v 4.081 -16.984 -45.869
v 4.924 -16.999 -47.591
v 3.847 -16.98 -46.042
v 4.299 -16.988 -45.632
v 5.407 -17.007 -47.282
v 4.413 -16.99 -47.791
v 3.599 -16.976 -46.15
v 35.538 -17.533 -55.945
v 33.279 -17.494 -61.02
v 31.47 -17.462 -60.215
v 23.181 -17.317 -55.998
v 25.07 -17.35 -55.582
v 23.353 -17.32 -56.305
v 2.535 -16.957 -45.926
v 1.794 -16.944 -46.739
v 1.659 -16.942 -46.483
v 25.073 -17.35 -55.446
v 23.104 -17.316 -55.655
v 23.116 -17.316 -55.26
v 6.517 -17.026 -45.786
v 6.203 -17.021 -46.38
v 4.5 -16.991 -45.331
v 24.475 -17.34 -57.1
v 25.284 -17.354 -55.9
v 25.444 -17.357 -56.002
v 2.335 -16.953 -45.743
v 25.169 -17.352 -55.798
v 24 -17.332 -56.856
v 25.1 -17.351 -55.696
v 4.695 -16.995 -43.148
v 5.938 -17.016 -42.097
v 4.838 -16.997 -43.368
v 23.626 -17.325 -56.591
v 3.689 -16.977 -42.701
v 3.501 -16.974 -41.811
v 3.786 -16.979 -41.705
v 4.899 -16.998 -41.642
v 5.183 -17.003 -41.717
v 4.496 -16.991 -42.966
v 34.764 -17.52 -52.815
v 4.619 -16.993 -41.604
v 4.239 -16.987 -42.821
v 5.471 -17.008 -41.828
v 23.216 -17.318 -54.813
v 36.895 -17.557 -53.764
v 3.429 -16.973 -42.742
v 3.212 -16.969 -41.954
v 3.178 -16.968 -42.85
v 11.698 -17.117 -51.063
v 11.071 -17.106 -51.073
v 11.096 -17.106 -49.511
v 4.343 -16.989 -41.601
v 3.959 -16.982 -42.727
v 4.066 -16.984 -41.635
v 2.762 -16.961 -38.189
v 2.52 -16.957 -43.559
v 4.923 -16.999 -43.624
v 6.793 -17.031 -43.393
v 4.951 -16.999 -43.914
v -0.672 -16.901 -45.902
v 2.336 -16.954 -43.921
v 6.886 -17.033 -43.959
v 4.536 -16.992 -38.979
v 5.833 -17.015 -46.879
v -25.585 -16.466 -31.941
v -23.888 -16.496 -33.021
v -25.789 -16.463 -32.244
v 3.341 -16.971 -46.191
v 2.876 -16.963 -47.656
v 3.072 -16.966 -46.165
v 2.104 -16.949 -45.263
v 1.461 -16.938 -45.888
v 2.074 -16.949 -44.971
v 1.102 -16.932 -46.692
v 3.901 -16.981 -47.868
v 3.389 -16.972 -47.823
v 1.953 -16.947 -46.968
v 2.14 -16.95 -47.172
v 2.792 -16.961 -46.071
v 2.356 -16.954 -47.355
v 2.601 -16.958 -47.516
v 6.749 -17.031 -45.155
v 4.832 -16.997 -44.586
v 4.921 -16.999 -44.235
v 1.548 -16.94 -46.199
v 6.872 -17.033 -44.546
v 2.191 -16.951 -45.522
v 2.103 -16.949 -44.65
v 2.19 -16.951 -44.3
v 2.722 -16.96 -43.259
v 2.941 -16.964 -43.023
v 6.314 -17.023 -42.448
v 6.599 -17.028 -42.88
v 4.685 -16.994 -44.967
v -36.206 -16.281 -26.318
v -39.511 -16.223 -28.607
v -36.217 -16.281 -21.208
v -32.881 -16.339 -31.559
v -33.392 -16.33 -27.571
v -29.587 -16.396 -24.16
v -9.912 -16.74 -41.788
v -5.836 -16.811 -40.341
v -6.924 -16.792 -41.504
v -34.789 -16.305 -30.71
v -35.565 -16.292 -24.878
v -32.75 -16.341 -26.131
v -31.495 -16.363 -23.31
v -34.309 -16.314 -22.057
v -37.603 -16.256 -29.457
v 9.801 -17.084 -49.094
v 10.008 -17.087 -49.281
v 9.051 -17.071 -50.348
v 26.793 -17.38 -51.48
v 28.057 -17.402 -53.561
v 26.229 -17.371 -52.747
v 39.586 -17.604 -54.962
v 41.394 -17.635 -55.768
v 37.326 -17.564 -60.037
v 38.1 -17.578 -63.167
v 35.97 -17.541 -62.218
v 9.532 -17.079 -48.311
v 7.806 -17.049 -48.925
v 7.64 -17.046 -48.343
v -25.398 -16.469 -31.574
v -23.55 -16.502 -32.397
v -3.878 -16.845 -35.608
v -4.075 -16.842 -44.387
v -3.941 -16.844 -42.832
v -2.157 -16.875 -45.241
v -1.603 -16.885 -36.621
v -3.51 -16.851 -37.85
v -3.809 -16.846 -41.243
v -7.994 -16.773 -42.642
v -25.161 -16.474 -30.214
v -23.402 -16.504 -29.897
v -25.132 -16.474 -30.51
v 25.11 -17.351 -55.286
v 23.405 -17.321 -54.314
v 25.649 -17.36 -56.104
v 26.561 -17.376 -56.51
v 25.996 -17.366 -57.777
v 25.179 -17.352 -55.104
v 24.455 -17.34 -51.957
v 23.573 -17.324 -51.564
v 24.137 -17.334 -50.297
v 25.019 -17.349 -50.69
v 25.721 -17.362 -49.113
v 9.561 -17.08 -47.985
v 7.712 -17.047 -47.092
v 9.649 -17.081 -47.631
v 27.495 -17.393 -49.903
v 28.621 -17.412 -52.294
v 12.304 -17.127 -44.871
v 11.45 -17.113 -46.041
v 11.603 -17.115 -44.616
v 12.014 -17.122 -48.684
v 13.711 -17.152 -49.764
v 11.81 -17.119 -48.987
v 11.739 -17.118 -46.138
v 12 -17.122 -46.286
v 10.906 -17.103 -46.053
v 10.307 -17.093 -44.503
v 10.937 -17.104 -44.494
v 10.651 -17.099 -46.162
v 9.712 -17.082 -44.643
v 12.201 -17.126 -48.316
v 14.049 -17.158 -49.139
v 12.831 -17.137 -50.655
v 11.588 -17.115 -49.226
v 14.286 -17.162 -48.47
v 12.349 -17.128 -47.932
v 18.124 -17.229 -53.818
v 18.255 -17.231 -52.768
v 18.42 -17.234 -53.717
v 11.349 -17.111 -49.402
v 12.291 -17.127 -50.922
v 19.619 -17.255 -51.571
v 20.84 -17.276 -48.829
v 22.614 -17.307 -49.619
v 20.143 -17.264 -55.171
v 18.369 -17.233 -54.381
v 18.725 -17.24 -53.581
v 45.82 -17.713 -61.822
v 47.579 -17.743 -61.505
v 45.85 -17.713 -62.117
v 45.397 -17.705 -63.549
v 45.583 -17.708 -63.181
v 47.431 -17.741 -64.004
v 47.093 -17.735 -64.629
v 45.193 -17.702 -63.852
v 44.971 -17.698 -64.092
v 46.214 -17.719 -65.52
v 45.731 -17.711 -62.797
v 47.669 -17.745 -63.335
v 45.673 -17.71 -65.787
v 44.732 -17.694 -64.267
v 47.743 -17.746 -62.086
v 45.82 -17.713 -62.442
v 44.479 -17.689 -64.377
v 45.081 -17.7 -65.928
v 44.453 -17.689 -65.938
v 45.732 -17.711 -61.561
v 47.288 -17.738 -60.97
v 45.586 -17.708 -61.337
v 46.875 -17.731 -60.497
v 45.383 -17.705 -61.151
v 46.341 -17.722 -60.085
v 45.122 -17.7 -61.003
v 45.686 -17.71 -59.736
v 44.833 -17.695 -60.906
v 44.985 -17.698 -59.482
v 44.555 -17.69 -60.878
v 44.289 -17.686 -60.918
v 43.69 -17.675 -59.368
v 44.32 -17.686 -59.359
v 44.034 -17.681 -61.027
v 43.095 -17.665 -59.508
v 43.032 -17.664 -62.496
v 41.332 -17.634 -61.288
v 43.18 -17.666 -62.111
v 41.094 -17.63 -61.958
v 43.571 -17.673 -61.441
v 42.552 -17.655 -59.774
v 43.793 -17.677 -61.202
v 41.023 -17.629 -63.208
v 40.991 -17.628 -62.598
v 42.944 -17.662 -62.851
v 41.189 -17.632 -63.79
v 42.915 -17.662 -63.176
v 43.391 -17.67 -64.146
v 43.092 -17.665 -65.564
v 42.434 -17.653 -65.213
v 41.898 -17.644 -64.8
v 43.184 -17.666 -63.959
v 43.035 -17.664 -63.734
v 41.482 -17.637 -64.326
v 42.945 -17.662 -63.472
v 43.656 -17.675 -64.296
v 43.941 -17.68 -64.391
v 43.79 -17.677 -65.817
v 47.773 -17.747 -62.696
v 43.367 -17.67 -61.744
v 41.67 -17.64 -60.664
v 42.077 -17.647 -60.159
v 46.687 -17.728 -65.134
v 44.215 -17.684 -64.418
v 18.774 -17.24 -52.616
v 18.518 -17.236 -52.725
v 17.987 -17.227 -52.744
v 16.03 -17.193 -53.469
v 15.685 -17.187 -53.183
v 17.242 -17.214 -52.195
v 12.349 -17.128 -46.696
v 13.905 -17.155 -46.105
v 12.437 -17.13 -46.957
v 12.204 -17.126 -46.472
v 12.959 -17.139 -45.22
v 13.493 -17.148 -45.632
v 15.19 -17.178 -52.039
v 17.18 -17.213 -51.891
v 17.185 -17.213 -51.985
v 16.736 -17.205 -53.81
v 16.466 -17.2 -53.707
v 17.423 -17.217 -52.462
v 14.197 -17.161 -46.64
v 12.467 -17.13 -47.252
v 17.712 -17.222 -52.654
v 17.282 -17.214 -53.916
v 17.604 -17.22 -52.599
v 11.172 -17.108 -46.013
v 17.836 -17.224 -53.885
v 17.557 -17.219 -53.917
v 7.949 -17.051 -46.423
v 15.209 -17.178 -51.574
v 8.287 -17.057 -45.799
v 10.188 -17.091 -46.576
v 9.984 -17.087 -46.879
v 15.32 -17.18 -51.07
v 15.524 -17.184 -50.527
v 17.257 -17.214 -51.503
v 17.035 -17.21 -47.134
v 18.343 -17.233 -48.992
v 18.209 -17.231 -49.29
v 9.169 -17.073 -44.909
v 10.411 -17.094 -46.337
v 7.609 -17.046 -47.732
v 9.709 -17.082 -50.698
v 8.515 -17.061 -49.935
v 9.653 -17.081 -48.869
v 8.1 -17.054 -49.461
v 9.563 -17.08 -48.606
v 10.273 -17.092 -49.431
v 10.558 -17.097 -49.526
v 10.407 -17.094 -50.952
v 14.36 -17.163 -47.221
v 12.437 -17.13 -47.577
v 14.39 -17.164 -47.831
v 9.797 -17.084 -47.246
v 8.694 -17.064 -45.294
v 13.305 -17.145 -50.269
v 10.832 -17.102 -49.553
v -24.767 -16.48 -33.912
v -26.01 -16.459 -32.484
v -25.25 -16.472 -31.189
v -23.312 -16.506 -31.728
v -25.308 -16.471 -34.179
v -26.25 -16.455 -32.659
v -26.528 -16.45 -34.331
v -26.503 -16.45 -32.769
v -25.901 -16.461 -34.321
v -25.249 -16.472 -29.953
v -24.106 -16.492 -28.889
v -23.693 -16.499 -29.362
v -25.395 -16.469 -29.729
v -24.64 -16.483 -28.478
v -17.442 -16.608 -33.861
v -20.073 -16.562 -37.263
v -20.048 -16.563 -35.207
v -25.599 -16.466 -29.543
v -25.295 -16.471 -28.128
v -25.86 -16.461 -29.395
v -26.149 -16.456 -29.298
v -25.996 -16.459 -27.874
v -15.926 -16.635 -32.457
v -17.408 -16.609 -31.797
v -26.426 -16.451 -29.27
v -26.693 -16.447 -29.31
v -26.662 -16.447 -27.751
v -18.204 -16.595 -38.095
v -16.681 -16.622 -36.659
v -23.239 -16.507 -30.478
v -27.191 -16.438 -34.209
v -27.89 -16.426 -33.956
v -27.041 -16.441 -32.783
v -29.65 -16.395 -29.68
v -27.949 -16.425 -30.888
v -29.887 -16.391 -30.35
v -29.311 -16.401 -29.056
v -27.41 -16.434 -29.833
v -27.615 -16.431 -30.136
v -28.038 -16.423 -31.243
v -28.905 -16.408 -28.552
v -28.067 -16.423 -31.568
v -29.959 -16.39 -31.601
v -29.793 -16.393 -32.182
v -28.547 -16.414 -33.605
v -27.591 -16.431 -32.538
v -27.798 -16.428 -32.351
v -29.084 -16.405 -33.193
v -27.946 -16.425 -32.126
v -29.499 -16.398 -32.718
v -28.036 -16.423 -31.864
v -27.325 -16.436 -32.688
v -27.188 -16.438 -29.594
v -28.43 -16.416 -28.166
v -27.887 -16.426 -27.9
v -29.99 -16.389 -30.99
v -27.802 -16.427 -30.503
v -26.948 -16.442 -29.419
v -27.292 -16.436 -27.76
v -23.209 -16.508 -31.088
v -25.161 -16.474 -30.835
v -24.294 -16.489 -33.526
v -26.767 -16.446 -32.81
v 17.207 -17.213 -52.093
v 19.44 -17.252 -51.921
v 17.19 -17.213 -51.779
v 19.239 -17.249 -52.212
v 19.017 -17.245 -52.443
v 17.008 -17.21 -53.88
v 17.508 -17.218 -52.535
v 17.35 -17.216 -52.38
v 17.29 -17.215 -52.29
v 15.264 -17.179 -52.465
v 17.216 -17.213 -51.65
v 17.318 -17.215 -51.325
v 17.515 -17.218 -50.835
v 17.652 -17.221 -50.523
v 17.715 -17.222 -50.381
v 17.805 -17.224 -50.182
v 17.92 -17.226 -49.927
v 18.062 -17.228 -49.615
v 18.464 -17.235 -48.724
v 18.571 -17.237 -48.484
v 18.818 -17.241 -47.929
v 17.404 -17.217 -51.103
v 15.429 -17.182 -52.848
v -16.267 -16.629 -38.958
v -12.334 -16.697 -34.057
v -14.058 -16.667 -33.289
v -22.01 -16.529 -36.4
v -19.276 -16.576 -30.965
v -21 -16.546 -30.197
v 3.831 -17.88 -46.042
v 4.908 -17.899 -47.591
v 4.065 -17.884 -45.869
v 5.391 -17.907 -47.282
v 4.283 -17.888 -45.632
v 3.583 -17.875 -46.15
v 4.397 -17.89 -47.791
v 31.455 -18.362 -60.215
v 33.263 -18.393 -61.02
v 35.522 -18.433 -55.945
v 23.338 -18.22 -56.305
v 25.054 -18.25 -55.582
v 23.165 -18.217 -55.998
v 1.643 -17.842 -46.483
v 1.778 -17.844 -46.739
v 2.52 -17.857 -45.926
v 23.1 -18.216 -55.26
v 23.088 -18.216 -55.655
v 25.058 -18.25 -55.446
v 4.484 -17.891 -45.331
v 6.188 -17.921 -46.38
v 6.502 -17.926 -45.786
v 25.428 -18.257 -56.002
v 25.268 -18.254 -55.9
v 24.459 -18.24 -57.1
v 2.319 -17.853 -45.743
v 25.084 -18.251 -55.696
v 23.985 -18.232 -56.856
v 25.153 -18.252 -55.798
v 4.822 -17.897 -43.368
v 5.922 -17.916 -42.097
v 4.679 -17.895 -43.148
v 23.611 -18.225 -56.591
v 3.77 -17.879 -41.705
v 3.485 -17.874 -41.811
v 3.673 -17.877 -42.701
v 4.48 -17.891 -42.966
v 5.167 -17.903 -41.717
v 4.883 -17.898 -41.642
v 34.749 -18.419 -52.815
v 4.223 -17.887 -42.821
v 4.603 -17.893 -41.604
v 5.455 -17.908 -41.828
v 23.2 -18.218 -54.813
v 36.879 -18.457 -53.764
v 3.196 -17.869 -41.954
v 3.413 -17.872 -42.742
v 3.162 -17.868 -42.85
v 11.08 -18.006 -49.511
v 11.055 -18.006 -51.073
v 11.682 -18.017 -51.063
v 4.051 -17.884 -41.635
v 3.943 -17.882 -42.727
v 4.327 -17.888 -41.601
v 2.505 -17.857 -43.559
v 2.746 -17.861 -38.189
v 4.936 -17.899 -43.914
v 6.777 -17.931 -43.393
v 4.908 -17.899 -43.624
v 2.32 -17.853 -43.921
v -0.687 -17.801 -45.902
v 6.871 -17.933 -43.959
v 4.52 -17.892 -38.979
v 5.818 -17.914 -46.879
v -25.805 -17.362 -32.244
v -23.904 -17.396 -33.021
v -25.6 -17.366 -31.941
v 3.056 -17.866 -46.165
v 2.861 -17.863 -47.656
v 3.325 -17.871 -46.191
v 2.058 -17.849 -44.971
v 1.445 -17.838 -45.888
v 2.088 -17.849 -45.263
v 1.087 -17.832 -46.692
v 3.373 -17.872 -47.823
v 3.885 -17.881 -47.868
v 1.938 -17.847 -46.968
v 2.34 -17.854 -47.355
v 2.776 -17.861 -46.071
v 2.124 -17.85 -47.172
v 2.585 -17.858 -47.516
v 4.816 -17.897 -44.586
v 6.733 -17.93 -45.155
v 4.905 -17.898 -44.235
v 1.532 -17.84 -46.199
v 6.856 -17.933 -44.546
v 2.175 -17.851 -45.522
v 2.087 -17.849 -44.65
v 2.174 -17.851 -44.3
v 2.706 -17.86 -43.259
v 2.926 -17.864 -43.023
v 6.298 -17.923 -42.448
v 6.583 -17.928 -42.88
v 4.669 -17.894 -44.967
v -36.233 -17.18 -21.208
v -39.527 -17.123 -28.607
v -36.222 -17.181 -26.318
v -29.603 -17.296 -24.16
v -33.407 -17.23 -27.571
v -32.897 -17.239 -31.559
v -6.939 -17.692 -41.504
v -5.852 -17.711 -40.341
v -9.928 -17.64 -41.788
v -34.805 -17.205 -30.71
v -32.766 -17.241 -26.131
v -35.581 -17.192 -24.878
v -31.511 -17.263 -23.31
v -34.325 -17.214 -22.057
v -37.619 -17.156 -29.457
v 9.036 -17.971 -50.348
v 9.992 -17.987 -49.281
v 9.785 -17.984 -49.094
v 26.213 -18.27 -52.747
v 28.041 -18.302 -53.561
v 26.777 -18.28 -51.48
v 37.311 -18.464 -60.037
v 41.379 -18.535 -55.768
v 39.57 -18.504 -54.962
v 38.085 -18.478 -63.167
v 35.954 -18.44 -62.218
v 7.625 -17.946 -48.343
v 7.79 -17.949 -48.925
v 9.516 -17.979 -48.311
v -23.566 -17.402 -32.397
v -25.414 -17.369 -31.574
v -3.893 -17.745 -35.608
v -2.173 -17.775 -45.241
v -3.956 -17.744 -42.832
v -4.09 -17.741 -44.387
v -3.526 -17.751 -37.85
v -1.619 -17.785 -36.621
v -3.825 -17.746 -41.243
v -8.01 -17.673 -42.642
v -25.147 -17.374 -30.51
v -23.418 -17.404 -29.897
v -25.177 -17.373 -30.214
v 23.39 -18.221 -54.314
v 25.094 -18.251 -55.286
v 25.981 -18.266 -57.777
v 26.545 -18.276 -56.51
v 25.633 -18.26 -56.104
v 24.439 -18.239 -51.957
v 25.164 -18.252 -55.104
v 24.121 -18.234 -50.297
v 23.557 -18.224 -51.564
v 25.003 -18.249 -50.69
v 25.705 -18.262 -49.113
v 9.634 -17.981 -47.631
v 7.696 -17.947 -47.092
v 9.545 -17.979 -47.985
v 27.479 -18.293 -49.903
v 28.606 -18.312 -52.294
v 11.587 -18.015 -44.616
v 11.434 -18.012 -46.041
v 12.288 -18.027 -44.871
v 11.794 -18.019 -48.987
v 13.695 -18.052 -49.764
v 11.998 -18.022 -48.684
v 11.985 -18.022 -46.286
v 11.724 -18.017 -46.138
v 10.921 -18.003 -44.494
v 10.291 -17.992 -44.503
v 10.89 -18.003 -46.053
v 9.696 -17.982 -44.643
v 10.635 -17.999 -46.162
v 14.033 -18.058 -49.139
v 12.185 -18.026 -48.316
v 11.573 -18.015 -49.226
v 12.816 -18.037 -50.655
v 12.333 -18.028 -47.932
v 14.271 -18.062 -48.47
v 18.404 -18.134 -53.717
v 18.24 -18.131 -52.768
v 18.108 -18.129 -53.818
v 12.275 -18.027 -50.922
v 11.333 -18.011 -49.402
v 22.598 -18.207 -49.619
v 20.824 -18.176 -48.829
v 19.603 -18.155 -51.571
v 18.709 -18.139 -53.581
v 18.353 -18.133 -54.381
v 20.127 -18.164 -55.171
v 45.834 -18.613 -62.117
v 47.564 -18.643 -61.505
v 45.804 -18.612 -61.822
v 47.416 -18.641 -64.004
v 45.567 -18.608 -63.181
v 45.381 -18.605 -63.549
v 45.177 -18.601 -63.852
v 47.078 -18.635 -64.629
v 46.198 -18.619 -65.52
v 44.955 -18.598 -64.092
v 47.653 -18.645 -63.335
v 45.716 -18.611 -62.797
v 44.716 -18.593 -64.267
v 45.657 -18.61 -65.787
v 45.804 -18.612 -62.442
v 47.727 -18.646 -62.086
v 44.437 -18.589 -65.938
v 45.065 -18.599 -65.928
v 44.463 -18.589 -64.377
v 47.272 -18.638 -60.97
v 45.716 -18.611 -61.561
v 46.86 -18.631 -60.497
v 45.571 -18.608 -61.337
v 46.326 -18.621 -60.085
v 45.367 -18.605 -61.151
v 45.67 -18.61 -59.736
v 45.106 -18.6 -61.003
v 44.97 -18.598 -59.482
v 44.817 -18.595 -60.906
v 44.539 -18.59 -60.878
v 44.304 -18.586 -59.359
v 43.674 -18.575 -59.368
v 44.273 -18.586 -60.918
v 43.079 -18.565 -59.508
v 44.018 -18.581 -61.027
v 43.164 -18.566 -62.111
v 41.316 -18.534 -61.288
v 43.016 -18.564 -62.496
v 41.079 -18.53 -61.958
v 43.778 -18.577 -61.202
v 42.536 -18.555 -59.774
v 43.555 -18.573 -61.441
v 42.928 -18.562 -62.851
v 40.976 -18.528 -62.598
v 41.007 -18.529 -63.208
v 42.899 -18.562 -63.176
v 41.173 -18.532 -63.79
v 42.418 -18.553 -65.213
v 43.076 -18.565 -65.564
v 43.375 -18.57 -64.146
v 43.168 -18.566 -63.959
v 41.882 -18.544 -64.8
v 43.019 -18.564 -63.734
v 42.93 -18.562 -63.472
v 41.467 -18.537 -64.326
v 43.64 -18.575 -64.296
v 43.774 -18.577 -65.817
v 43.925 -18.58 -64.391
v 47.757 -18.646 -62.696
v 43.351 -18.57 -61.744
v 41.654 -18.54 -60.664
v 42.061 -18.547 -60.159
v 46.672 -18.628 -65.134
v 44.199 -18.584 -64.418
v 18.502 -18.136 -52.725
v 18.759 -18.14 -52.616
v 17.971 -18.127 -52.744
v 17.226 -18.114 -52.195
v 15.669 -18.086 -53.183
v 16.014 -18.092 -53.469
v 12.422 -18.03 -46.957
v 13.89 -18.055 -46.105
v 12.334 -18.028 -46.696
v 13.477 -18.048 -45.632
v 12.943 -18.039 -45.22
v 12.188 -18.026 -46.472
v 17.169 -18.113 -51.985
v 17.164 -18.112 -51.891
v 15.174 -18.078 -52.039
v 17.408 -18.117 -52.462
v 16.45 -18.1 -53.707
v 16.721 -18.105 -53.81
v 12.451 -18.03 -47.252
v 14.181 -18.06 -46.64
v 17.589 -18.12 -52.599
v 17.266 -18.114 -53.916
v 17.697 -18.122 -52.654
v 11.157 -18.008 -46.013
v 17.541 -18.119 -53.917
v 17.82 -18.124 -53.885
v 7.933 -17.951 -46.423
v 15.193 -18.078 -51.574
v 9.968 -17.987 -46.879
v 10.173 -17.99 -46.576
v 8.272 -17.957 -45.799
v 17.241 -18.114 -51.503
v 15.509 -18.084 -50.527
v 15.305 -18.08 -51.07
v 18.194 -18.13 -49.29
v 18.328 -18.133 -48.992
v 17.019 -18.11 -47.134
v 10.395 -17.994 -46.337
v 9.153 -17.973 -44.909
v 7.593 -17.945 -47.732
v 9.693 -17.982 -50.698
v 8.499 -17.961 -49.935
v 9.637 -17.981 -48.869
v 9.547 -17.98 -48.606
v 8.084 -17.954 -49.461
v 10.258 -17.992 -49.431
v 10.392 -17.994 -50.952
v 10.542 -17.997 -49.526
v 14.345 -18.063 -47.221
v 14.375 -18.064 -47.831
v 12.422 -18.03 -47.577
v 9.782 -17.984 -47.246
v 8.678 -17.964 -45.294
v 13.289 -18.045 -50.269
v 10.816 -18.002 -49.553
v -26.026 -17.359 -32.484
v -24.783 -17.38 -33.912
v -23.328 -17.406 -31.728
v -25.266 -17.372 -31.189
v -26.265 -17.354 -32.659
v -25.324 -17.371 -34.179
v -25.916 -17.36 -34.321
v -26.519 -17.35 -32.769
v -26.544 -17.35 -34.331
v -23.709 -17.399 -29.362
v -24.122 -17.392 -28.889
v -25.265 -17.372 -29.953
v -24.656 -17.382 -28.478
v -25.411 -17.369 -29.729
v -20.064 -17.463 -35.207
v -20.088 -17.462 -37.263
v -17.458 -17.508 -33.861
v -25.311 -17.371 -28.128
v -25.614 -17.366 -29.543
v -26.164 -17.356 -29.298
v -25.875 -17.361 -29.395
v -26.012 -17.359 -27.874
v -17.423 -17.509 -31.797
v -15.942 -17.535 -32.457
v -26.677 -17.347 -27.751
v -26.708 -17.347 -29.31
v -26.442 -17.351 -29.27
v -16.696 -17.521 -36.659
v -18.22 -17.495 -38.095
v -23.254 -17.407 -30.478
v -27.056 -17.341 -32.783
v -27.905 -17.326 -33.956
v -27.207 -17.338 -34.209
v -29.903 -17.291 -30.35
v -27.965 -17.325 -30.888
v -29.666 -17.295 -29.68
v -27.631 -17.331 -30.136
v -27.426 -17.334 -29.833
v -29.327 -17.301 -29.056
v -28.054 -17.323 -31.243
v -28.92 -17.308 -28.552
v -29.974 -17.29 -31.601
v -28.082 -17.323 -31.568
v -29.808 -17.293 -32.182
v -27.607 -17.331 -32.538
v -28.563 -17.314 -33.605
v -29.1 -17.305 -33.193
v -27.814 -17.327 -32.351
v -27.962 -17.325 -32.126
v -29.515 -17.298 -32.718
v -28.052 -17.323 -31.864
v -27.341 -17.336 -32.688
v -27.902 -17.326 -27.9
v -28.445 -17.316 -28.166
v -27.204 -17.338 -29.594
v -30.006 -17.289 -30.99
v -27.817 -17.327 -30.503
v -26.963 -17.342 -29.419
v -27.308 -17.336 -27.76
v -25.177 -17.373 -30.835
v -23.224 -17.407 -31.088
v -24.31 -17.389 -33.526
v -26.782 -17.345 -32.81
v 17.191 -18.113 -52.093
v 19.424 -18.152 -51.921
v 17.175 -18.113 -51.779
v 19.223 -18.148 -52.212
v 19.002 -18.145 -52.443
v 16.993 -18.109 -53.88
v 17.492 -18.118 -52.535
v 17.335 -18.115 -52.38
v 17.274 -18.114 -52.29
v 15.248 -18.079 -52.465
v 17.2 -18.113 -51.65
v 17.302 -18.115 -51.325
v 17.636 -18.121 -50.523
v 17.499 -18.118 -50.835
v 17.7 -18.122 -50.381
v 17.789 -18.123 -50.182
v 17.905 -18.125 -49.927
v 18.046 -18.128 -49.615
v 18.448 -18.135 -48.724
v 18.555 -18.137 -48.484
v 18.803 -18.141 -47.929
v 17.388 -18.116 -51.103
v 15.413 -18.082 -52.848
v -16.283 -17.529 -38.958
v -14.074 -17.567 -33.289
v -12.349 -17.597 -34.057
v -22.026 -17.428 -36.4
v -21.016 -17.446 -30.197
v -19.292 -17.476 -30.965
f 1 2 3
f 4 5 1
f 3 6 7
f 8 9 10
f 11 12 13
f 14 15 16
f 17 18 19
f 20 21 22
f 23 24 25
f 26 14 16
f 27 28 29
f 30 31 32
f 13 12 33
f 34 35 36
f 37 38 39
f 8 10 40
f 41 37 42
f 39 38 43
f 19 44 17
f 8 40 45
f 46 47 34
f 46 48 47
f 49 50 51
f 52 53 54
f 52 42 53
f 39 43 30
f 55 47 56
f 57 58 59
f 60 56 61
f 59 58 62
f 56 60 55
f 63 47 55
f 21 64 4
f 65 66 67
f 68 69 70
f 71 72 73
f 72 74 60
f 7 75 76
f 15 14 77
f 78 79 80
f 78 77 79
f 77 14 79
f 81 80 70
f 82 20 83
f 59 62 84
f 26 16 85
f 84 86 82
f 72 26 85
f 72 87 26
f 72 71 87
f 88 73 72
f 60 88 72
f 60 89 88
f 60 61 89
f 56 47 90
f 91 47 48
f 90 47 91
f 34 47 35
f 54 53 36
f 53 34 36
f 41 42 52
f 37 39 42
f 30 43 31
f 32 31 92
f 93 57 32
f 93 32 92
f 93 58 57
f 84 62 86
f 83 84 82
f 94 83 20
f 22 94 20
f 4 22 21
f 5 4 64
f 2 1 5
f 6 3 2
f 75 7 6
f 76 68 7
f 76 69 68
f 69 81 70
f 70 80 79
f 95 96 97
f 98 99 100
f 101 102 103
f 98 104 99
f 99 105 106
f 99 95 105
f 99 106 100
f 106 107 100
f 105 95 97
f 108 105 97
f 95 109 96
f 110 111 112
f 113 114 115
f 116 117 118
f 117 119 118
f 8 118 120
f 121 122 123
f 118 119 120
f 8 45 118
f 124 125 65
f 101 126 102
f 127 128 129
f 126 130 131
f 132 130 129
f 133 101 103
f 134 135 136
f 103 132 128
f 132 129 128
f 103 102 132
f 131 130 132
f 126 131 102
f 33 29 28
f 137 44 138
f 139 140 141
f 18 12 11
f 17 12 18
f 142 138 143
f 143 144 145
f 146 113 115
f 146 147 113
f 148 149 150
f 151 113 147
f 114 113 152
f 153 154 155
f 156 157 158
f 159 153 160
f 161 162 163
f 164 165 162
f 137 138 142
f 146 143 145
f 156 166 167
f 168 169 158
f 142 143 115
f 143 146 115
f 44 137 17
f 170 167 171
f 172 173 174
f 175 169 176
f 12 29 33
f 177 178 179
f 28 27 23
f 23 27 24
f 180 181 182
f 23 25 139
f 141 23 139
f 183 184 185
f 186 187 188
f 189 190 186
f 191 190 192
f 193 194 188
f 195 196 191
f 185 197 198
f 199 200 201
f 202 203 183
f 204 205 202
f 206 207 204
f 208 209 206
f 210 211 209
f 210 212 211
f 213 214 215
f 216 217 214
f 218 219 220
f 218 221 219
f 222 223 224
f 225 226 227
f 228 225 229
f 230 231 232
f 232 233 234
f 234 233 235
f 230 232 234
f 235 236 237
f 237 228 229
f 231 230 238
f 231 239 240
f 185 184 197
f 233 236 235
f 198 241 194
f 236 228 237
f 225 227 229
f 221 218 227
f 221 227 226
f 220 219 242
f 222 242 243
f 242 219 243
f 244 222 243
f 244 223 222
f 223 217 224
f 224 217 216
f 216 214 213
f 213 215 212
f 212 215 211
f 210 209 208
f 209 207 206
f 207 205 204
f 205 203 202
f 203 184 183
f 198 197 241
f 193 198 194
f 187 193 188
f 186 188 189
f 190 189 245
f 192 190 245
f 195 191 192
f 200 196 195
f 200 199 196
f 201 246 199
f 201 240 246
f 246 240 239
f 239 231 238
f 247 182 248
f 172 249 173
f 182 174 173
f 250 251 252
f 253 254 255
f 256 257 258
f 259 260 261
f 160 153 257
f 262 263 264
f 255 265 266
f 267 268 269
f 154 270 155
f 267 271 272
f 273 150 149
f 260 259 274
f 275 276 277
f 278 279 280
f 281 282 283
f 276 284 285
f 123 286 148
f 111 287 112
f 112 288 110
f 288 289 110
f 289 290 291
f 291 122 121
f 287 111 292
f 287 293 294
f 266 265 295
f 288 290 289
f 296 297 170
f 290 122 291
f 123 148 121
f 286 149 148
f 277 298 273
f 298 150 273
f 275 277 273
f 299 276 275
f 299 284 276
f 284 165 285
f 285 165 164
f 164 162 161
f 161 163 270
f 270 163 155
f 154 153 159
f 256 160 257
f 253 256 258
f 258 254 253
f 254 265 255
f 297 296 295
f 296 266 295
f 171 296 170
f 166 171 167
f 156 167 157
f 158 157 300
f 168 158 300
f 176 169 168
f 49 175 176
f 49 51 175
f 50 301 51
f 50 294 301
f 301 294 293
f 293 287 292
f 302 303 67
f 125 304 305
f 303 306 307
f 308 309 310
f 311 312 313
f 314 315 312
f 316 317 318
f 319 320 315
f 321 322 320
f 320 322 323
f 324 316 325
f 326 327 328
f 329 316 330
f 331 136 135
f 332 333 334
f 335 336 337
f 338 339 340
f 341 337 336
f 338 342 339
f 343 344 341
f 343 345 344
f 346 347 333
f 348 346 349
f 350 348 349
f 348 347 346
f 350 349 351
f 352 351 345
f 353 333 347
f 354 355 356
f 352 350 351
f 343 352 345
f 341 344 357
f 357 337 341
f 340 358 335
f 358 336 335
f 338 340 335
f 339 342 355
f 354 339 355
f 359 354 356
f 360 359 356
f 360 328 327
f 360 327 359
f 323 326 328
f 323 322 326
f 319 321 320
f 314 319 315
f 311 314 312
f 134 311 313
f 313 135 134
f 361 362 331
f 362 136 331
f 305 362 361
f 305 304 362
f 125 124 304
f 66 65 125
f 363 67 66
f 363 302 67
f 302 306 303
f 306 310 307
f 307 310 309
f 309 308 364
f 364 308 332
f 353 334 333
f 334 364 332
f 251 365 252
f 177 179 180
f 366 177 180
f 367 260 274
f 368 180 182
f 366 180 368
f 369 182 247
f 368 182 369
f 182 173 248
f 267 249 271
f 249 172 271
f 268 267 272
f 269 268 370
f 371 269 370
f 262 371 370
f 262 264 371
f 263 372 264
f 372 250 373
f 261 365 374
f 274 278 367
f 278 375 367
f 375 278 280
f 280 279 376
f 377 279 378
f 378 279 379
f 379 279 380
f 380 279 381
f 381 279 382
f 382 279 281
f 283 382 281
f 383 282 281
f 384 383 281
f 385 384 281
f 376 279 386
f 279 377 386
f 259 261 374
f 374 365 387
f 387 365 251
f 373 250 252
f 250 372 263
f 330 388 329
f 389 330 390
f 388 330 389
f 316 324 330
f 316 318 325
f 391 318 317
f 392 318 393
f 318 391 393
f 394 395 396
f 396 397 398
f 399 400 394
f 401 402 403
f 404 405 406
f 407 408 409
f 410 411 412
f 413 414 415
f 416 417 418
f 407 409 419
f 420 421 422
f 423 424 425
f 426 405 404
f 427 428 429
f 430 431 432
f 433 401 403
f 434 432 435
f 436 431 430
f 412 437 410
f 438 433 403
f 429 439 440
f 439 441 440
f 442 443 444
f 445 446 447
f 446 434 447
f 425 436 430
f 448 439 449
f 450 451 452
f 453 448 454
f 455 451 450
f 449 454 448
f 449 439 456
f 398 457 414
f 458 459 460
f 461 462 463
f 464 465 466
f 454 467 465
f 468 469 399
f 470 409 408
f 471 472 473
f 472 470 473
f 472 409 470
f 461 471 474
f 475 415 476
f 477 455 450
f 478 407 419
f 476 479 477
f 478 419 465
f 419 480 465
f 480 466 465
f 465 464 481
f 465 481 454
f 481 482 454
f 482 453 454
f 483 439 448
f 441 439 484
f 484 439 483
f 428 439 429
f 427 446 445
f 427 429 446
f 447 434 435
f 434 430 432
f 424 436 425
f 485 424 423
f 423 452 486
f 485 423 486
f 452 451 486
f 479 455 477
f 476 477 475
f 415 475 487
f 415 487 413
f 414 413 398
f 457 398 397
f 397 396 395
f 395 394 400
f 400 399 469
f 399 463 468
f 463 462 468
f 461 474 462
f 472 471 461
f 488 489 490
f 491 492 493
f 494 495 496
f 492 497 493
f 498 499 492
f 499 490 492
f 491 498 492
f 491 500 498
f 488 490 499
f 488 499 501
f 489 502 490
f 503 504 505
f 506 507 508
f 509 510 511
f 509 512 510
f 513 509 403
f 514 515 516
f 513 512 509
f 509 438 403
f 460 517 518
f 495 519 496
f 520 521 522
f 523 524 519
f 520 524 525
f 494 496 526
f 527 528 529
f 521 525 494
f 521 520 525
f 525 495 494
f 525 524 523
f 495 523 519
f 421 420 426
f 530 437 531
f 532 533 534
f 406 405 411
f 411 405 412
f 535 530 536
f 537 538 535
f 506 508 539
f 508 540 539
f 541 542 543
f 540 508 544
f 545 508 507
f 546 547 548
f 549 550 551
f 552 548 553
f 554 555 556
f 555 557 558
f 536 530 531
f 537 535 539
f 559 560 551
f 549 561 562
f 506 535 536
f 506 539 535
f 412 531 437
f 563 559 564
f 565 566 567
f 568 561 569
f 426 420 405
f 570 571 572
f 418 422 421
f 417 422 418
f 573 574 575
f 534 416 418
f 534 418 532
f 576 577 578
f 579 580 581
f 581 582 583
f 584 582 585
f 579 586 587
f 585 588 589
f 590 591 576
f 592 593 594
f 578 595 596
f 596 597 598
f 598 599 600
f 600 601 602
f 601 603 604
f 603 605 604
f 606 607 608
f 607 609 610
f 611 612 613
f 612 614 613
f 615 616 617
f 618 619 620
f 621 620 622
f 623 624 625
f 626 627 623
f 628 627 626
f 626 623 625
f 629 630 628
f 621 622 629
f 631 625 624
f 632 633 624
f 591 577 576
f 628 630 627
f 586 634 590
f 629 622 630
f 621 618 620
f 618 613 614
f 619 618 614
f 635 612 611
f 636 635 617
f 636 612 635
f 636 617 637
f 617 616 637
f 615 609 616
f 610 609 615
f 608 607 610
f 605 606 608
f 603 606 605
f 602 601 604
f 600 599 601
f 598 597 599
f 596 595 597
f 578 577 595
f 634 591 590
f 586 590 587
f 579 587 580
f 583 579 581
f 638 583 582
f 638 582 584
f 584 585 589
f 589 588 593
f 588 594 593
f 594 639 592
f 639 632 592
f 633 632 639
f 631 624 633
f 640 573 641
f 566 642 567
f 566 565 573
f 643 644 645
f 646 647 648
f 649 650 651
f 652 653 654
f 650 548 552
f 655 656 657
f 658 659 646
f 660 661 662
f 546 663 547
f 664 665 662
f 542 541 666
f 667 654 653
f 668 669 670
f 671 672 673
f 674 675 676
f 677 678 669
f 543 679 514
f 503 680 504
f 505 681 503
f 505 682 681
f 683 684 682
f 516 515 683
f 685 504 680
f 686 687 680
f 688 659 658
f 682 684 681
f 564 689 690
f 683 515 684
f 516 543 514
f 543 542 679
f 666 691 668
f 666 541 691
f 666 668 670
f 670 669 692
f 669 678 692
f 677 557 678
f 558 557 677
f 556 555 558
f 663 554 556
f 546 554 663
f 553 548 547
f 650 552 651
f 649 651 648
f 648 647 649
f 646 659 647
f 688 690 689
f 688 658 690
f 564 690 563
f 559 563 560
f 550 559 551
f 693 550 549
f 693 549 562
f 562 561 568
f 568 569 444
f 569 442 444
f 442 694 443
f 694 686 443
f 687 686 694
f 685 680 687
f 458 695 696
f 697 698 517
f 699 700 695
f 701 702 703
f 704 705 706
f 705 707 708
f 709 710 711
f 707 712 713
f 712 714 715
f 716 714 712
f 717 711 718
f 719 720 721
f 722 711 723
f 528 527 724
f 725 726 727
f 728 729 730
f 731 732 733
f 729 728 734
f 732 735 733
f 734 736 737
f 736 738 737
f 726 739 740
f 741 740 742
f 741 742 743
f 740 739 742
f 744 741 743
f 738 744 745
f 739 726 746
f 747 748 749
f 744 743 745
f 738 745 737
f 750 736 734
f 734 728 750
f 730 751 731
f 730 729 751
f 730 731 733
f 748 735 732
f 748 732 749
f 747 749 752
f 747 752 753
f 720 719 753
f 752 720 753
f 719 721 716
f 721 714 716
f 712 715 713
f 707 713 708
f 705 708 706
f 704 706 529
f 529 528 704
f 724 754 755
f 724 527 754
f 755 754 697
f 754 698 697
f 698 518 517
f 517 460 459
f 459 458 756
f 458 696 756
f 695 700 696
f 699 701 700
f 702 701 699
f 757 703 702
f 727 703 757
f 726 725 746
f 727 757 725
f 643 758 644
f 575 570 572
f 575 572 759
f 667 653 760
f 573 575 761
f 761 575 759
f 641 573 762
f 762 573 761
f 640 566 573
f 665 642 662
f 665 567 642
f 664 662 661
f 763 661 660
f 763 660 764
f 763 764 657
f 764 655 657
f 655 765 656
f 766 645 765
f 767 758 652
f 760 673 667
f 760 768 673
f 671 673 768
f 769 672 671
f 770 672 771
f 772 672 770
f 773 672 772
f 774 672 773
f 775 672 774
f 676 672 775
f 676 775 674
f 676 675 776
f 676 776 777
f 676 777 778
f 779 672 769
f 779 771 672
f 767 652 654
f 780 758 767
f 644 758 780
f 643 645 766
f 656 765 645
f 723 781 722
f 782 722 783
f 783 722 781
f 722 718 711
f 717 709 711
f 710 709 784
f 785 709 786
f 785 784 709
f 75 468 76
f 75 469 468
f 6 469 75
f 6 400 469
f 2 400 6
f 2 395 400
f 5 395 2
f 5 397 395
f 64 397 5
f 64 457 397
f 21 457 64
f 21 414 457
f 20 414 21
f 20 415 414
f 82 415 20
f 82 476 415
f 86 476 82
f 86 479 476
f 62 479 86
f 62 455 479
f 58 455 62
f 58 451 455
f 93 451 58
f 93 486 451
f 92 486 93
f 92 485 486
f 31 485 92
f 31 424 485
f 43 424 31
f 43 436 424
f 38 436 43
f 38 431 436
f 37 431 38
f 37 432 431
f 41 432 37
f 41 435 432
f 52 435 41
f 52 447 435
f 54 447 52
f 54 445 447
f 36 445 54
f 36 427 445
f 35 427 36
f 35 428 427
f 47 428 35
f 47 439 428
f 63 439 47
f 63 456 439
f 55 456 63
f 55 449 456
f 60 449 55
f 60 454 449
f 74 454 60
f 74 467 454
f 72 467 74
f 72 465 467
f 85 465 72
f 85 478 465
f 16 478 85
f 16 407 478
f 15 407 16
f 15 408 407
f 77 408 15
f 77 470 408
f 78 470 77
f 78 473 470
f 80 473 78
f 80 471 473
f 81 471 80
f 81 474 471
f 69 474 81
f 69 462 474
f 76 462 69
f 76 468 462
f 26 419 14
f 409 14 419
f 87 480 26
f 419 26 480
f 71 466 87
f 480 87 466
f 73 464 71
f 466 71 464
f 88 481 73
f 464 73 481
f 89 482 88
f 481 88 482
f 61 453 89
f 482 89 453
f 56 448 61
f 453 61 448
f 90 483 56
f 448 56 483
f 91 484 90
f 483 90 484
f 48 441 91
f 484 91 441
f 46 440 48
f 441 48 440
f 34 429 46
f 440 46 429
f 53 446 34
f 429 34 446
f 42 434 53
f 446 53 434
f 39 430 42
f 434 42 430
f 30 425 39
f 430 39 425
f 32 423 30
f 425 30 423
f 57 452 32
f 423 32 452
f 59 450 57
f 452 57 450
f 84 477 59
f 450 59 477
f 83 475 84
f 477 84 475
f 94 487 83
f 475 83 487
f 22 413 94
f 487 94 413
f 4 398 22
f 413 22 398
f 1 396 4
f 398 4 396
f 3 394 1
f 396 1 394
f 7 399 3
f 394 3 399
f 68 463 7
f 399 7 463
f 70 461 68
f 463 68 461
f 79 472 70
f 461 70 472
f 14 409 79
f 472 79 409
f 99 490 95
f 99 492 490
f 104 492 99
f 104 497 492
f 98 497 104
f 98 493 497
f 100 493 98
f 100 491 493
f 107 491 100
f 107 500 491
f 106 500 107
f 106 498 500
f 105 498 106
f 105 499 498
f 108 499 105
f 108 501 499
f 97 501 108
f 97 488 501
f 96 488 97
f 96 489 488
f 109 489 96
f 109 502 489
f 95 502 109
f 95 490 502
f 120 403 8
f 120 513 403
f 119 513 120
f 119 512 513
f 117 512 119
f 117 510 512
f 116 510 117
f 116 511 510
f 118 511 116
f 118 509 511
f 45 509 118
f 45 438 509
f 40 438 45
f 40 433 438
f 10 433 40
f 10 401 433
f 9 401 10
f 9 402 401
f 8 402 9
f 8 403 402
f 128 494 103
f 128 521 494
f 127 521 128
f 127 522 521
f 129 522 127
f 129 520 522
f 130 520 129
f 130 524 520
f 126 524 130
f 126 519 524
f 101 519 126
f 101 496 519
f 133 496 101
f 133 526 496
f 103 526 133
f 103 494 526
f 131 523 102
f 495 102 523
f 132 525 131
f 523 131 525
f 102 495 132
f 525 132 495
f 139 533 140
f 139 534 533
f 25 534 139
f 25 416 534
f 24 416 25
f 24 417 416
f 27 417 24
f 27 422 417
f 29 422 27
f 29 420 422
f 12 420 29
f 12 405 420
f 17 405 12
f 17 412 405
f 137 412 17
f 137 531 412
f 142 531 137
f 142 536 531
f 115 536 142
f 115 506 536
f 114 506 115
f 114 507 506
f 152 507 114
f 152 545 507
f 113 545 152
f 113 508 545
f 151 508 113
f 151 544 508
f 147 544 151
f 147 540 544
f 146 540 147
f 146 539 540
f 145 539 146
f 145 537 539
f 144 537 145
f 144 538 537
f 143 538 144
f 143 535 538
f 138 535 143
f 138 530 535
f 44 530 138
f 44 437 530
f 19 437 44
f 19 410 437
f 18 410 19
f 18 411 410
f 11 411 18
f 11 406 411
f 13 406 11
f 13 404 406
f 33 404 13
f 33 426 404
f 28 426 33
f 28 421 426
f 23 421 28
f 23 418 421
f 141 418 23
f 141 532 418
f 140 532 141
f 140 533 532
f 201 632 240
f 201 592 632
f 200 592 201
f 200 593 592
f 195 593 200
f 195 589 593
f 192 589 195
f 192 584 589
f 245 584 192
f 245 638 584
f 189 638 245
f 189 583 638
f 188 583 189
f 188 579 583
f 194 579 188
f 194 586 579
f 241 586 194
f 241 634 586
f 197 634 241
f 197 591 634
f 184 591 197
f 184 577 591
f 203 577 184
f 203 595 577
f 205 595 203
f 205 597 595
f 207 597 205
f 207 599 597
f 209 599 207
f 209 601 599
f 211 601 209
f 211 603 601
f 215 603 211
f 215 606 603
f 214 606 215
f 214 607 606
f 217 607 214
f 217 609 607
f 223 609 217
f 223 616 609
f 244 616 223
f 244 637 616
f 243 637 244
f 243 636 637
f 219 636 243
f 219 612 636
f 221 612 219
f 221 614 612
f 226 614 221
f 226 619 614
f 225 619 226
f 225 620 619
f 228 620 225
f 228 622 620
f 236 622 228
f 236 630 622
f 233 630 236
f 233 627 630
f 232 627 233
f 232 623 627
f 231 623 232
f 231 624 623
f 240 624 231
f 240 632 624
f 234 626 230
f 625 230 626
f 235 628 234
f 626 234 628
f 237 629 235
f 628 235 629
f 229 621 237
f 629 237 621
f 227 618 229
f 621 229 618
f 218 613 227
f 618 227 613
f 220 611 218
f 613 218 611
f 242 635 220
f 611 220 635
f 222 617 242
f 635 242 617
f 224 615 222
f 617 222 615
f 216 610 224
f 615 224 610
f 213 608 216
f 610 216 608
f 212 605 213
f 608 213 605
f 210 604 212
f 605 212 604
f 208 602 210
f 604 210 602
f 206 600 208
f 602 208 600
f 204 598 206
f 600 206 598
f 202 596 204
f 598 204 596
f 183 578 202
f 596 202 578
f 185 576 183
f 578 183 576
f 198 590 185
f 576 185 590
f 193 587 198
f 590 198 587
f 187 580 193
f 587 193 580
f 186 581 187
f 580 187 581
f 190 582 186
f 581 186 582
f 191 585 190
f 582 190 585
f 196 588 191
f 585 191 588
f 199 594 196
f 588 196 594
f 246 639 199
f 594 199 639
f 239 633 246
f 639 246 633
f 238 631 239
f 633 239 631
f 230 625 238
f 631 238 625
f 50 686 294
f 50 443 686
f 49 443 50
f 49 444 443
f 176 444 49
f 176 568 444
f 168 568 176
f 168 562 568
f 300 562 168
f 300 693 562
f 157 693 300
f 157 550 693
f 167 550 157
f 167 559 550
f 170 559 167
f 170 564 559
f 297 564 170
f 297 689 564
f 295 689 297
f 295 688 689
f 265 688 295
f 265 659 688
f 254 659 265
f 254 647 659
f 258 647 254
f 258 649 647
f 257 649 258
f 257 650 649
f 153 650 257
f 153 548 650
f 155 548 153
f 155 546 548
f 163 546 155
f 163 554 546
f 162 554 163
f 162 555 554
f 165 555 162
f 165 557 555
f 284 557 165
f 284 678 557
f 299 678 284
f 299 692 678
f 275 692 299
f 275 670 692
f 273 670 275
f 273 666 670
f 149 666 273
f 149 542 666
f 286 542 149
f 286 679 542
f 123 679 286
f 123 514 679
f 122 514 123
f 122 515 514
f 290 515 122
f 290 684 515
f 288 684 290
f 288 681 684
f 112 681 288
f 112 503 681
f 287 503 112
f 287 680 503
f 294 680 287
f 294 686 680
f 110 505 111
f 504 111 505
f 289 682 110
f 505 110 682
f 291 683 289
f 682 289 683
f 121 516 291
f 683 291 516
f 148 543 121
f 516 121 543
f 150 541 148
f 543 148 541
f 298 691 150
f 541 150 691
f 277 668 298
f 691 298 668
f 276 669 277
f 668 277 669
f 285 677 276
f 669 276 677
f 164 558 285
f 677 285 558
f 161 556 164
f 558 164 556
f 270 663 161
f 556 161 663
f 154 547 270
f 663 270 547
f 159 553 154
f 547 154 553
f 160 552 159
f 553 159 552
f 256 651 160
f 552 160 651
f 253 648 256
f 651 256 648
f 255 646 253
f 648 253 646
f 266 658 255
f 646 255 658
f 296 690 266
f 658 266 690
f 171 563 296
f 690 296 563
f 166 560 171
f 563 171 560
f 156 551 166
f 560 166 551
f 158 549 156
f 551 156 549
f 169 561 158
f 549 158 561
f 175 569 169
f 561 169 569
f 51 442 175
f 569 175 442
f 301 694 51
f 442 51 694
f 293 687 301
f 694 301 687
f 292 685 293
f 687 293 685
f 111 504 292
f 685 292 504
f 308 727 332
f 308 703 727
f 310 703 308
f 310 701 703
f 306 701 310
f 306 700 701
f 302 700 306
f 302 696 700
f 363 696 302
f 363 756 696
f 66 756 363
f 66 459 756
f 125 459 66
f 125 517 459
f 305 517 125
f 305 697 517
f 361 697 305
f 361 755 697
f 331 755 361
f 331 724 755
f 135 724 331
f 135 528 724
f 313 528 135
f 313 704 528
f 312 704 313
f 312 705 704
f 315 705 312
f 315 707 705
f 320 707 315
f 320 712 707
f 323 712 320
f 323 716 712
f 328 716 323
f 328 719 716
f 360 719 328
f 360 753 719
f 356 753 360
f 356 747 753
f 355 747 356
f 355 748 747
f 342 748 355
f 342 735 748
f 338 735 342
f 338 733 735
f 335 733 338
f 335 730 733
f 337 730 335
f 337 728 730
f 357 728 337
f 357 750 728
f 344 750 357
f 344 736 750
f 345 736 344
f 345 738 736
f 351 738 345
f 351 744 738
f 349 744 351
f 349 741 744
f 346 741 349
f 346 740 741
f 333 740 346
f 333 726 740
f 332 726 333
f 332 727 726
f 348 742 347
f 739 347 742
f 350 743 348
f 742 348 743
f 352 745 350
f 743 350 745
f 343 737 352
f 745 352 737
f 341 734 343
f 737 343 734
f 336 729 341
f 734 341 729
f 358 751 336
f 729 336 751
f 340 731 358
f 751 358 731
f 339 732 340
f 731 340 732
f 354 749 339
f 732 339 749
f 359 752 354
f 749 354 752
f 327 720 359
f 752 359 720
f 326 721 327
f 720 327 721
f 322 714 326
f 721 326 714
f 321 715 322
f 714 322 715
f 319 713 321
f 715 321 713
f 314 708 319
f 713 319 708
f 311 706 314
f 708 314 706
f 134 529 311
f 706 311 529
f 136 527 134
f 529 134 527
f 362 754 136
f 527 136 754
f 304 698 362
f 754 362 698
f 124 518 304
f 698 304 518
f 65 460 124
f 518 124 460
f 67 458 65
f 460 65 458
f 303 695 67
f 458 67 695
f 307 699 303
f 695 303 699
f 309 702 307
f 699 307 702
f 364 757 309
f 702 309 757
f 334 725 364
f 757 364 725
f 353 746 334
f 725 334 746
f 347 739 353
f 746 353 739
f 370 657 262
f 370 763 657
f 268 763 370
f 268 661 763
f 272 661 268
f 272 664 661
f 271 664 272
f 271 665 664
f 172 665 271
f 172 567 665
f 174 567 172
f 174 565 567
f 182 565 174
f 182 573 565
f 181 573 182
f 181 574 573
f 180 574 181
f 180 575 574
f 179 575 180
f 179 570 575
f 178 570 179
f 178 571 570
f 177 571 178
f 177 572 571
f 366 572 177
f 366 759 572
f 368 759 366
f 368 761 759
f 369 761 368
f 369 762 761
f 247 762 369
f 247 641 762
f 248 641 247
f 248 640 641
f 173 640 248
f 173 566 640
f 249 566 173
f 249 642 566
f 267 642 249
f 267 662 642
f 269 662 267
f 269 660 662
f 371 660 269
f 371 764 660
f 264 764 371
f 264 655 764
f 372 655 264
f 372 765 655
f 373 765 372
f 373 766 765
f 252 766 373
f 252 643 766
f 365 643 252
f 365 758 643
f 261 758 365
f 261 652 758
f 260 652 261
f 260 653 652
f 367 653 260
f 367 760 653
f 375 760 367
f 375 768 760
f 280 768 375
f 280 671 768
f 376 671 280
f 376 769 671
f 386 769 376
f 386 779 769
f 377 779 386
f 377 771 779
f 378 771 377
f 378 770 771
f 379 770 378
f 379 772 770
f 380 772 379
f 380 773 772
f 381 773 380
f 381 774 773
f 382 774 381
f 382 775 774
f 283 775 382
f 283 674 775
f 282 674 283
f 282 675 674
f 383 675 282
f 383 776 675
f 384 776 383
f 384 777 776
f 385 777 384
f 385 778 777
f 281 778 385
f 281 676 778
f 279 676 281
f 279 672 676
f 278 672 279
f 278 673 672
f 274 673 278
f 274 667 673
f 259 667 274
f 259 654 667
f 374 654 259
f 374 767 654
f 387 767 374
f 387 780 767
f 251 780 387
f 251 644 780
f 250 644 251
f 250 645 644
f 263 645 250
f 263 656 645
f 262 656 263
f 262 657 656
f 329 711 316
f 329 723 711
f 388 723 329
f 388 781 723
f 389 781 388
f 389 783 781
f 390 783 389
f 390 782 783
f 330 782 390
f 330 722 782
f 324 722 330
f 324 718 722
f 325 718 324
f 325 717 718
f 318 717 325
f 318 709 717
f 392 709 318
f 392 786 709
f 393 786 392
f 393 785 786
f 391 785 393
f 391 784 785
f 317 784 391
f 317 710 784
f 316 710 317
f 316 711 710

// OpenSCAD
// file: ../Parts/hexcut.scad
// hexcut

//--------------------------------
module hexcut1(
R=1,
x0=0,
y0=0,
h0=10,
N0=4
){
        
    for (i=[0:N0-1]){
        translate([x0,y0+i*R*2,-1])
        cylinder(r=R,h=h0,$fn=6);
    }
    for (i=[0:N0-2]){
        translate([x0-1.717*R,y0+R+i*R*2,-1])
        cylinder(r=R,h=h0,$fn=6);
    }
    for (i=[0:N0-2]){
        translate([x0+1.717*R,y0+R+i*R*2,-1])
        cylinder(r=R,h=h0,$fn=6);
    }

}


//=======================
    
hexcut1(R=1,x0=0,y0=0,h0=10,N0=4);
    
    
// file: ../Parts/rounder.scad
// rounder.scad
// cutting tool for rounding off corners with a cylinder

//---------------------
module rounder(
r=10,   // radius
h=10,   // height
f=22,    // $fn
extra=0.01  // extra size for the cube
){

difference(){
  translate([-extra,-extra,-extra])
  cube([r+extra,r+extra,h+2*extra]);
  translate([r,r,-1])
  cylinder(r=r,h=h+2,$fn=f);
}

}

//---------------------------------------------------------------------------
module bevel(x=1,y=1,h=10){

linear_extrude(height=h)
polygon(points=[[0,0],[x,0],[0,y]]);
    
}
  

//========================

rounder();

//========================
// main file
//======================================================================
// BatEar3.scad
//
// Passive vocal monitor that clips onto safety glasses
//
// DrTomFlint, 6 March 2025
//======================================================================

use <../Parts/rounder.scad>
use <../Parts/hexcut.scad>
use <../Parts/threads.scad>
use <../Gears/gears.scad>

flip=0;

// location of ear
x1 = -35;
y1 = -5;
z1 = -25;
m1 = 12;

// location of midway
x2 = 40;
y2 = 0;
z2 = -60;
m2 = 30;
flat2 = 0.6;

// location of mouth
x3 = 75;
y3 = 20;
z3 = -70;
m3 = 40;
flat3 = 0.60;

// move hollow out to account for flattening
flatfix = 0.5;

// height of lenses
z0 = 55;      

// location of pivot post
zpost=5;
stopAngle= 2 * 360/10;

Version="J";

F1=299;
F2=55;


//----------------------------------------------------------------------
// over the glasses protective goggles
module glassHalf(){
  
  // lens front
  translate([0,-238,-5])
  intersection(){
    linear_extrude(height=z0)
    difference(){
      circle(r=250,$fn=F1);
      circle(r=248,$fn=F1);
    }
    translate([35,200,0])
    cube  ([70,180,150],center=true);
  }
  
  points=[ [0,0], [0,45], [-14,45], [-38,40], [-72,30], [-97,20], [-110,10], [-120,0], [-130,-15], [-124,-25], [-113,-15], [-112,0], [-92,10], [-78,12], [-63,10], [-14,0] ];
  translate([70,0,0])
  rotate([0,0,90])
  rotate([90,0,0])
  linear_extrude(height=2)
  polygon(points);
  
}

//----------------------------------------------------------------------
// mounting point onto glassses
module mount2(){

thick=2;
ang=14;
  
  // main loop
  intersection(){
    difference(){
      hull(){
        translate([0,0,12.5])
        rotate([0,90-ang,0])
        cylinder(r=1.5*thick,h=17+1,center=true,$fn=F2);
        translate([0,0,-12.5])
        rotate([0,90+ang,0])
        cylinder(r=1.5*thick,h=17+1,center=true,$fn=F2);
      }
      translate([0,-0.5,0]){
        hull(){
          translate([0,0,12.5])
          rotate([0,90-ang,0])
          cylinder(r=0.6*thick,h=17+2,center=true,$fn=F2);
          translate([0,0,-12.5])
          rotate([0,90+ang,0])
          cylinder(r=0.6*thick,h=17+2,center=true,$fn=F2);
        }
        // extra trim at edges
        translate([0,0.5,12.5-0.5])
        rotate([0,90-ang,0])
        cylinder(r=0.85*thick,h=17+2,center=true,$fn=F2);
        translate([0,0.5,-12.5+0.5])
        rotate([0,90+ang,0])
        cylinder(r=0.85*thick,h=17+2,center=true,$fn=F2);
        
        // version number
        translate([0,1.5*thick,0])
        rotate([0,0,180])
        rotate([90,0,0])
        linear_extrude(height=0.605)
        text(Version, font = "Open Sans:style=Bold", size=8,halign="center",valign="center",spacing=1.1);

      }
    }
    cube([16,20,40],center=true);
  }
  
  // post
  intersection(){
    difference(){
      union(){
        // fillet
        translate([5,-1.5*thick,zpost])
        rotate([90,0,0])
        cylinder(r1=4.8,r2=3.9,h=1,$fn=F2);        
        // main shaft
        translate([5,-1.5*thick,zpost])
        rotate([90,0,0])
        cylinder(r=4,h=5.2,$fn=F2);
        // inner angle
        translate([5,-1.5*thick-4.5,zpost])
        rotate([90,0,0])
        cylinder(r1=4.0,r2=4.8,h=0.5,$fn=F2);
        // outer angle
        translate([5,-1.5*thick-5,zpost])
        rotate([90,0,0])
        cylinder(r1=4.8,r2=3.9,h=1,$fn=F2);
      }
      translate([5,-1.5*thick-5.5,zpost])
      cube([20,10,1.5],center=true);
      translate([5,-1.5*thick-5.5,zpost])
      cube([1.5,10,20],center=true);
    }
  
    cube([16,20,40],center=true);
  }
  
  // stopper
  translate([-5.5,-3,-5])
  rotate([90,0,0])
  cylinder(r=2,h=5,$fn=10);

  
}


//----------------------------------------------------------------------
module stopAdjust(tol=0.15){

    translate([-5.5,-3,-5])
    rotate([0,stopAngle,0])
    translate([5.5,3,5])

  difference(){
    translate([-5.5-1.5,-3,-5])
    rotate([90,0,0])
    cylinder(r=5,h=5,$fn=F2);

    translate([-5.5,-3,-5])
    rotate([90,0,0])
    cylinder(r=2+tol,h=5,$fn=10);
  }

}


//----------------------------------------------------------------------
module tunnel2(T=1.2){

  // tunnel
  difference(){
    union(){
      // upper tunnel
      hull(){  
        translate([x1,y1,z1])  
        sphere(r=m1,$fn=F1);
        translate([x2,y2,z2])
        scale([1,flat2,1])
        sphere(r=m2,$fn=F1);

        translate([x1,y1+30,z1])  
        sphere(r=m1,$fn=F1);
        translate([x2,y2+30,z2])
        scale([1,flat2,1])
        sphere(r=m2,$fn=F1);
      }
      // lower tunnel
      hull(){  
        translate([x2,y2,z2])  
        scale([1,flat2,1])
        sphere(r=m2,$fn=F1);
        translate([x3,y3,z3])
        scale([0.5,flat3,1])
        sphere(r=m3,$fn=F1);

        translate([x2,y2+40,z2])  
        scale([1,flat2,1])
        sphere(r=m2,$fn=F1);
        translate([x3,y3+40,z3])
        scale([0.5,flat3,1])
        sphere(r=m3,$fn=F1);
      }
      // ear disk
      translate([x1,y1+0,z1])  
      rotate([0,-45,0])
      rotate([90,0,0])
      scale([1,1.4,1])
      cylinder(r=20,h=1.5*T,center=true,$fn=F2);

      // upper panel
      hull(){
        translate([x1,y1+0,z1+16])  
        rotate([90,0,0])
        cylinder(r=6,h=1.5*T,center=true,$fn=F2);
        translate([x2,y1+3,z2+30])  
        rotate([90,0,0])
        cylinder(r=12,h=1.5*T,center=true,$fn=F2);
      }

      // lower attach to post
      hull(){
        // midpoint block
        translate([5,-5,-6])
        rotate([0,10,0])
        cube([10,4,1],center=true);
        // tunnel block
        translate([5,-6,-30])
        rotate([0,18,0])
        cube([30,3,1],center=true);
      }
    }

    // cut for stop adjuster
    translate([-8,y1+0,z1+17])  
    scale([1,1,0.7])
    rotate([90,0,0])
    cylinder(r=6,h=10,center=true,$fn=F2);
    
    // hollow out
    hull(){  
      translate([x1,y1+flatfix,z1])  
      sphere(r=m1-T,$fn=F1);
      translate([x2,y2+flatfix,z2])
      scale([1,flat2,1])
      sphere(r=m2-T,$fn=F1);

      translate([x1,y1+40+flatfix,z1])  
      sphere(r=m1-T,$fn=F1);
      translate([x2,y2+40+flatfix,z2])
      scale([1,flat2,1])
      sphere(r=m2-T,$fn=F1);
    }
    hull(){  
      translate([x2,y2+flatfix,z2])  
      scale([1,flat2,1])
      sphere(r=m2-T,$fn=F1);
      translate([x3-flatfix,y3+flatfix,z3])
      scale([0.5,flat3,1])
      sphere(r=m3-T,$fn=F1);

      translate([x2,y2+40+flatfix,z2])  
      scale([1,flat2,1])
      sphere(r=m2-T,$fn=F1);
      translate([x3-flatfix,y3+40+flatfix,z3])
      scale([0.5,flat3,1])
      sphere(r=m3-T,$fn=F1);
    }
    
    // cut away near ear
    hull(){
      translate([x1-40,y1+25,z1])
      rotate([15,0,0])
      rotate([0,20,0])
      cylinder(r=m1-T+8,h=50,center=true,$fn=F2);
      
      translate([x2+0,y2+38,z2])
      rotate([15,0,0])
      rotate([0,20,0])
      cylinder(r=m2,h=84,center=true,$fn=F2);
    }

    // cut away near mouth
    hull(){
      translate([x2,74,z2])
      rotate([12,0,0])
      rotate([0,20,0])
      cylinder(r=65,h=120,center=true,$fn=F2);
    
      translate([x3,74+20,z2])
      rotate([12,0,0])
      rotate([0,20,0])
      cylinder(r=65,h=120,center=true,$fn=F2);
    
    }
    
    // version   
    translate([5,-6.8,-15])
    rotate([0,10,0])
    rotate([90,0,0])
    linear_extrude(height=1.5)
    text(Version, font = "Open Sans:style=Bold", size=9,halign="center",valign="center",spacing=1.1);

    if(1){
      words();
    }
    
  }
        
  // upper section attach to post
  thick=2;
  difference(){  
    hull(){
      // surround the post
      translate([5,-1.5*thick,zpost])
      rotate([90,0,0])
      cylinder(r=7,h=4.5,$fn=F1);
      // attachment to the tunnel
      translate([5,-5,-6])
      rotate([0,10,0])
      cube([10,4,1],center=true);
    }
    
    // cuts for pivot
    translate([5,-1.5*thick,zpost])
    rotate([90,0,0])
    cylinder(r=4.2,h=20,center=true,$fn=F1);
    
    translate([5,-2*thick-5.5,zpost])
    rotate([90,0,0])
    cylinder(r=6,h=4,center=true,$fn=F1);

    // fillet cut
    translate([5,-1.5*thick,zpost])
    rotate([90,0,0])
    cylinder(r1=4.8,r2=3.9,h=1,$fn=F2);        
  }
  
}

//-----------------------------------------------------------------------------------------------
module words(){
  
    translate([5,-17,-44])
    rotate([0,0,-1])
    rotate([0,24,0])
    rotate([90,0,0])
    #linear_extrude(height=0.9)
    text("How About No", font = "Open Sans:style=Bold", size=8,halign="center",valign="center",spacing=1.1);
}

//======================================================================

// choose 1 for design, 0 for print
design=0;

//---------------------------------------------------------
if(design==1){

thick=2;

mount2();
stopAdjust();


translate([5,-1.5*thick,zpost])
rotate([0,-flip,0])
translate([-5,1.5*thick,-zpost])

tunnel2();

if(0){
  difference(){
    tunnel2();
    translate([0,0,0])
  cube([300,100,100],center=true);
  }
}

// safety glasses approx
if(1){
  translate([55,71,-22])
  rotate([0,0,-90])
  glassHalf();
  mirror([0,1,0])
  translate([55,-71,-22])
  rotate([0,0,-90])
  glassHalf();
}


//---------------------------------------------------------
}else{
//---------------------------------------------------------
  
//~ mount();
//~ beam();
//~ beam2();
//~ ear();
//~ mouth();
//~ tunnel();


//~ mount2();
//~ stopAdjust();
//~ tunnel2();
words();

}  

//======================================================================
